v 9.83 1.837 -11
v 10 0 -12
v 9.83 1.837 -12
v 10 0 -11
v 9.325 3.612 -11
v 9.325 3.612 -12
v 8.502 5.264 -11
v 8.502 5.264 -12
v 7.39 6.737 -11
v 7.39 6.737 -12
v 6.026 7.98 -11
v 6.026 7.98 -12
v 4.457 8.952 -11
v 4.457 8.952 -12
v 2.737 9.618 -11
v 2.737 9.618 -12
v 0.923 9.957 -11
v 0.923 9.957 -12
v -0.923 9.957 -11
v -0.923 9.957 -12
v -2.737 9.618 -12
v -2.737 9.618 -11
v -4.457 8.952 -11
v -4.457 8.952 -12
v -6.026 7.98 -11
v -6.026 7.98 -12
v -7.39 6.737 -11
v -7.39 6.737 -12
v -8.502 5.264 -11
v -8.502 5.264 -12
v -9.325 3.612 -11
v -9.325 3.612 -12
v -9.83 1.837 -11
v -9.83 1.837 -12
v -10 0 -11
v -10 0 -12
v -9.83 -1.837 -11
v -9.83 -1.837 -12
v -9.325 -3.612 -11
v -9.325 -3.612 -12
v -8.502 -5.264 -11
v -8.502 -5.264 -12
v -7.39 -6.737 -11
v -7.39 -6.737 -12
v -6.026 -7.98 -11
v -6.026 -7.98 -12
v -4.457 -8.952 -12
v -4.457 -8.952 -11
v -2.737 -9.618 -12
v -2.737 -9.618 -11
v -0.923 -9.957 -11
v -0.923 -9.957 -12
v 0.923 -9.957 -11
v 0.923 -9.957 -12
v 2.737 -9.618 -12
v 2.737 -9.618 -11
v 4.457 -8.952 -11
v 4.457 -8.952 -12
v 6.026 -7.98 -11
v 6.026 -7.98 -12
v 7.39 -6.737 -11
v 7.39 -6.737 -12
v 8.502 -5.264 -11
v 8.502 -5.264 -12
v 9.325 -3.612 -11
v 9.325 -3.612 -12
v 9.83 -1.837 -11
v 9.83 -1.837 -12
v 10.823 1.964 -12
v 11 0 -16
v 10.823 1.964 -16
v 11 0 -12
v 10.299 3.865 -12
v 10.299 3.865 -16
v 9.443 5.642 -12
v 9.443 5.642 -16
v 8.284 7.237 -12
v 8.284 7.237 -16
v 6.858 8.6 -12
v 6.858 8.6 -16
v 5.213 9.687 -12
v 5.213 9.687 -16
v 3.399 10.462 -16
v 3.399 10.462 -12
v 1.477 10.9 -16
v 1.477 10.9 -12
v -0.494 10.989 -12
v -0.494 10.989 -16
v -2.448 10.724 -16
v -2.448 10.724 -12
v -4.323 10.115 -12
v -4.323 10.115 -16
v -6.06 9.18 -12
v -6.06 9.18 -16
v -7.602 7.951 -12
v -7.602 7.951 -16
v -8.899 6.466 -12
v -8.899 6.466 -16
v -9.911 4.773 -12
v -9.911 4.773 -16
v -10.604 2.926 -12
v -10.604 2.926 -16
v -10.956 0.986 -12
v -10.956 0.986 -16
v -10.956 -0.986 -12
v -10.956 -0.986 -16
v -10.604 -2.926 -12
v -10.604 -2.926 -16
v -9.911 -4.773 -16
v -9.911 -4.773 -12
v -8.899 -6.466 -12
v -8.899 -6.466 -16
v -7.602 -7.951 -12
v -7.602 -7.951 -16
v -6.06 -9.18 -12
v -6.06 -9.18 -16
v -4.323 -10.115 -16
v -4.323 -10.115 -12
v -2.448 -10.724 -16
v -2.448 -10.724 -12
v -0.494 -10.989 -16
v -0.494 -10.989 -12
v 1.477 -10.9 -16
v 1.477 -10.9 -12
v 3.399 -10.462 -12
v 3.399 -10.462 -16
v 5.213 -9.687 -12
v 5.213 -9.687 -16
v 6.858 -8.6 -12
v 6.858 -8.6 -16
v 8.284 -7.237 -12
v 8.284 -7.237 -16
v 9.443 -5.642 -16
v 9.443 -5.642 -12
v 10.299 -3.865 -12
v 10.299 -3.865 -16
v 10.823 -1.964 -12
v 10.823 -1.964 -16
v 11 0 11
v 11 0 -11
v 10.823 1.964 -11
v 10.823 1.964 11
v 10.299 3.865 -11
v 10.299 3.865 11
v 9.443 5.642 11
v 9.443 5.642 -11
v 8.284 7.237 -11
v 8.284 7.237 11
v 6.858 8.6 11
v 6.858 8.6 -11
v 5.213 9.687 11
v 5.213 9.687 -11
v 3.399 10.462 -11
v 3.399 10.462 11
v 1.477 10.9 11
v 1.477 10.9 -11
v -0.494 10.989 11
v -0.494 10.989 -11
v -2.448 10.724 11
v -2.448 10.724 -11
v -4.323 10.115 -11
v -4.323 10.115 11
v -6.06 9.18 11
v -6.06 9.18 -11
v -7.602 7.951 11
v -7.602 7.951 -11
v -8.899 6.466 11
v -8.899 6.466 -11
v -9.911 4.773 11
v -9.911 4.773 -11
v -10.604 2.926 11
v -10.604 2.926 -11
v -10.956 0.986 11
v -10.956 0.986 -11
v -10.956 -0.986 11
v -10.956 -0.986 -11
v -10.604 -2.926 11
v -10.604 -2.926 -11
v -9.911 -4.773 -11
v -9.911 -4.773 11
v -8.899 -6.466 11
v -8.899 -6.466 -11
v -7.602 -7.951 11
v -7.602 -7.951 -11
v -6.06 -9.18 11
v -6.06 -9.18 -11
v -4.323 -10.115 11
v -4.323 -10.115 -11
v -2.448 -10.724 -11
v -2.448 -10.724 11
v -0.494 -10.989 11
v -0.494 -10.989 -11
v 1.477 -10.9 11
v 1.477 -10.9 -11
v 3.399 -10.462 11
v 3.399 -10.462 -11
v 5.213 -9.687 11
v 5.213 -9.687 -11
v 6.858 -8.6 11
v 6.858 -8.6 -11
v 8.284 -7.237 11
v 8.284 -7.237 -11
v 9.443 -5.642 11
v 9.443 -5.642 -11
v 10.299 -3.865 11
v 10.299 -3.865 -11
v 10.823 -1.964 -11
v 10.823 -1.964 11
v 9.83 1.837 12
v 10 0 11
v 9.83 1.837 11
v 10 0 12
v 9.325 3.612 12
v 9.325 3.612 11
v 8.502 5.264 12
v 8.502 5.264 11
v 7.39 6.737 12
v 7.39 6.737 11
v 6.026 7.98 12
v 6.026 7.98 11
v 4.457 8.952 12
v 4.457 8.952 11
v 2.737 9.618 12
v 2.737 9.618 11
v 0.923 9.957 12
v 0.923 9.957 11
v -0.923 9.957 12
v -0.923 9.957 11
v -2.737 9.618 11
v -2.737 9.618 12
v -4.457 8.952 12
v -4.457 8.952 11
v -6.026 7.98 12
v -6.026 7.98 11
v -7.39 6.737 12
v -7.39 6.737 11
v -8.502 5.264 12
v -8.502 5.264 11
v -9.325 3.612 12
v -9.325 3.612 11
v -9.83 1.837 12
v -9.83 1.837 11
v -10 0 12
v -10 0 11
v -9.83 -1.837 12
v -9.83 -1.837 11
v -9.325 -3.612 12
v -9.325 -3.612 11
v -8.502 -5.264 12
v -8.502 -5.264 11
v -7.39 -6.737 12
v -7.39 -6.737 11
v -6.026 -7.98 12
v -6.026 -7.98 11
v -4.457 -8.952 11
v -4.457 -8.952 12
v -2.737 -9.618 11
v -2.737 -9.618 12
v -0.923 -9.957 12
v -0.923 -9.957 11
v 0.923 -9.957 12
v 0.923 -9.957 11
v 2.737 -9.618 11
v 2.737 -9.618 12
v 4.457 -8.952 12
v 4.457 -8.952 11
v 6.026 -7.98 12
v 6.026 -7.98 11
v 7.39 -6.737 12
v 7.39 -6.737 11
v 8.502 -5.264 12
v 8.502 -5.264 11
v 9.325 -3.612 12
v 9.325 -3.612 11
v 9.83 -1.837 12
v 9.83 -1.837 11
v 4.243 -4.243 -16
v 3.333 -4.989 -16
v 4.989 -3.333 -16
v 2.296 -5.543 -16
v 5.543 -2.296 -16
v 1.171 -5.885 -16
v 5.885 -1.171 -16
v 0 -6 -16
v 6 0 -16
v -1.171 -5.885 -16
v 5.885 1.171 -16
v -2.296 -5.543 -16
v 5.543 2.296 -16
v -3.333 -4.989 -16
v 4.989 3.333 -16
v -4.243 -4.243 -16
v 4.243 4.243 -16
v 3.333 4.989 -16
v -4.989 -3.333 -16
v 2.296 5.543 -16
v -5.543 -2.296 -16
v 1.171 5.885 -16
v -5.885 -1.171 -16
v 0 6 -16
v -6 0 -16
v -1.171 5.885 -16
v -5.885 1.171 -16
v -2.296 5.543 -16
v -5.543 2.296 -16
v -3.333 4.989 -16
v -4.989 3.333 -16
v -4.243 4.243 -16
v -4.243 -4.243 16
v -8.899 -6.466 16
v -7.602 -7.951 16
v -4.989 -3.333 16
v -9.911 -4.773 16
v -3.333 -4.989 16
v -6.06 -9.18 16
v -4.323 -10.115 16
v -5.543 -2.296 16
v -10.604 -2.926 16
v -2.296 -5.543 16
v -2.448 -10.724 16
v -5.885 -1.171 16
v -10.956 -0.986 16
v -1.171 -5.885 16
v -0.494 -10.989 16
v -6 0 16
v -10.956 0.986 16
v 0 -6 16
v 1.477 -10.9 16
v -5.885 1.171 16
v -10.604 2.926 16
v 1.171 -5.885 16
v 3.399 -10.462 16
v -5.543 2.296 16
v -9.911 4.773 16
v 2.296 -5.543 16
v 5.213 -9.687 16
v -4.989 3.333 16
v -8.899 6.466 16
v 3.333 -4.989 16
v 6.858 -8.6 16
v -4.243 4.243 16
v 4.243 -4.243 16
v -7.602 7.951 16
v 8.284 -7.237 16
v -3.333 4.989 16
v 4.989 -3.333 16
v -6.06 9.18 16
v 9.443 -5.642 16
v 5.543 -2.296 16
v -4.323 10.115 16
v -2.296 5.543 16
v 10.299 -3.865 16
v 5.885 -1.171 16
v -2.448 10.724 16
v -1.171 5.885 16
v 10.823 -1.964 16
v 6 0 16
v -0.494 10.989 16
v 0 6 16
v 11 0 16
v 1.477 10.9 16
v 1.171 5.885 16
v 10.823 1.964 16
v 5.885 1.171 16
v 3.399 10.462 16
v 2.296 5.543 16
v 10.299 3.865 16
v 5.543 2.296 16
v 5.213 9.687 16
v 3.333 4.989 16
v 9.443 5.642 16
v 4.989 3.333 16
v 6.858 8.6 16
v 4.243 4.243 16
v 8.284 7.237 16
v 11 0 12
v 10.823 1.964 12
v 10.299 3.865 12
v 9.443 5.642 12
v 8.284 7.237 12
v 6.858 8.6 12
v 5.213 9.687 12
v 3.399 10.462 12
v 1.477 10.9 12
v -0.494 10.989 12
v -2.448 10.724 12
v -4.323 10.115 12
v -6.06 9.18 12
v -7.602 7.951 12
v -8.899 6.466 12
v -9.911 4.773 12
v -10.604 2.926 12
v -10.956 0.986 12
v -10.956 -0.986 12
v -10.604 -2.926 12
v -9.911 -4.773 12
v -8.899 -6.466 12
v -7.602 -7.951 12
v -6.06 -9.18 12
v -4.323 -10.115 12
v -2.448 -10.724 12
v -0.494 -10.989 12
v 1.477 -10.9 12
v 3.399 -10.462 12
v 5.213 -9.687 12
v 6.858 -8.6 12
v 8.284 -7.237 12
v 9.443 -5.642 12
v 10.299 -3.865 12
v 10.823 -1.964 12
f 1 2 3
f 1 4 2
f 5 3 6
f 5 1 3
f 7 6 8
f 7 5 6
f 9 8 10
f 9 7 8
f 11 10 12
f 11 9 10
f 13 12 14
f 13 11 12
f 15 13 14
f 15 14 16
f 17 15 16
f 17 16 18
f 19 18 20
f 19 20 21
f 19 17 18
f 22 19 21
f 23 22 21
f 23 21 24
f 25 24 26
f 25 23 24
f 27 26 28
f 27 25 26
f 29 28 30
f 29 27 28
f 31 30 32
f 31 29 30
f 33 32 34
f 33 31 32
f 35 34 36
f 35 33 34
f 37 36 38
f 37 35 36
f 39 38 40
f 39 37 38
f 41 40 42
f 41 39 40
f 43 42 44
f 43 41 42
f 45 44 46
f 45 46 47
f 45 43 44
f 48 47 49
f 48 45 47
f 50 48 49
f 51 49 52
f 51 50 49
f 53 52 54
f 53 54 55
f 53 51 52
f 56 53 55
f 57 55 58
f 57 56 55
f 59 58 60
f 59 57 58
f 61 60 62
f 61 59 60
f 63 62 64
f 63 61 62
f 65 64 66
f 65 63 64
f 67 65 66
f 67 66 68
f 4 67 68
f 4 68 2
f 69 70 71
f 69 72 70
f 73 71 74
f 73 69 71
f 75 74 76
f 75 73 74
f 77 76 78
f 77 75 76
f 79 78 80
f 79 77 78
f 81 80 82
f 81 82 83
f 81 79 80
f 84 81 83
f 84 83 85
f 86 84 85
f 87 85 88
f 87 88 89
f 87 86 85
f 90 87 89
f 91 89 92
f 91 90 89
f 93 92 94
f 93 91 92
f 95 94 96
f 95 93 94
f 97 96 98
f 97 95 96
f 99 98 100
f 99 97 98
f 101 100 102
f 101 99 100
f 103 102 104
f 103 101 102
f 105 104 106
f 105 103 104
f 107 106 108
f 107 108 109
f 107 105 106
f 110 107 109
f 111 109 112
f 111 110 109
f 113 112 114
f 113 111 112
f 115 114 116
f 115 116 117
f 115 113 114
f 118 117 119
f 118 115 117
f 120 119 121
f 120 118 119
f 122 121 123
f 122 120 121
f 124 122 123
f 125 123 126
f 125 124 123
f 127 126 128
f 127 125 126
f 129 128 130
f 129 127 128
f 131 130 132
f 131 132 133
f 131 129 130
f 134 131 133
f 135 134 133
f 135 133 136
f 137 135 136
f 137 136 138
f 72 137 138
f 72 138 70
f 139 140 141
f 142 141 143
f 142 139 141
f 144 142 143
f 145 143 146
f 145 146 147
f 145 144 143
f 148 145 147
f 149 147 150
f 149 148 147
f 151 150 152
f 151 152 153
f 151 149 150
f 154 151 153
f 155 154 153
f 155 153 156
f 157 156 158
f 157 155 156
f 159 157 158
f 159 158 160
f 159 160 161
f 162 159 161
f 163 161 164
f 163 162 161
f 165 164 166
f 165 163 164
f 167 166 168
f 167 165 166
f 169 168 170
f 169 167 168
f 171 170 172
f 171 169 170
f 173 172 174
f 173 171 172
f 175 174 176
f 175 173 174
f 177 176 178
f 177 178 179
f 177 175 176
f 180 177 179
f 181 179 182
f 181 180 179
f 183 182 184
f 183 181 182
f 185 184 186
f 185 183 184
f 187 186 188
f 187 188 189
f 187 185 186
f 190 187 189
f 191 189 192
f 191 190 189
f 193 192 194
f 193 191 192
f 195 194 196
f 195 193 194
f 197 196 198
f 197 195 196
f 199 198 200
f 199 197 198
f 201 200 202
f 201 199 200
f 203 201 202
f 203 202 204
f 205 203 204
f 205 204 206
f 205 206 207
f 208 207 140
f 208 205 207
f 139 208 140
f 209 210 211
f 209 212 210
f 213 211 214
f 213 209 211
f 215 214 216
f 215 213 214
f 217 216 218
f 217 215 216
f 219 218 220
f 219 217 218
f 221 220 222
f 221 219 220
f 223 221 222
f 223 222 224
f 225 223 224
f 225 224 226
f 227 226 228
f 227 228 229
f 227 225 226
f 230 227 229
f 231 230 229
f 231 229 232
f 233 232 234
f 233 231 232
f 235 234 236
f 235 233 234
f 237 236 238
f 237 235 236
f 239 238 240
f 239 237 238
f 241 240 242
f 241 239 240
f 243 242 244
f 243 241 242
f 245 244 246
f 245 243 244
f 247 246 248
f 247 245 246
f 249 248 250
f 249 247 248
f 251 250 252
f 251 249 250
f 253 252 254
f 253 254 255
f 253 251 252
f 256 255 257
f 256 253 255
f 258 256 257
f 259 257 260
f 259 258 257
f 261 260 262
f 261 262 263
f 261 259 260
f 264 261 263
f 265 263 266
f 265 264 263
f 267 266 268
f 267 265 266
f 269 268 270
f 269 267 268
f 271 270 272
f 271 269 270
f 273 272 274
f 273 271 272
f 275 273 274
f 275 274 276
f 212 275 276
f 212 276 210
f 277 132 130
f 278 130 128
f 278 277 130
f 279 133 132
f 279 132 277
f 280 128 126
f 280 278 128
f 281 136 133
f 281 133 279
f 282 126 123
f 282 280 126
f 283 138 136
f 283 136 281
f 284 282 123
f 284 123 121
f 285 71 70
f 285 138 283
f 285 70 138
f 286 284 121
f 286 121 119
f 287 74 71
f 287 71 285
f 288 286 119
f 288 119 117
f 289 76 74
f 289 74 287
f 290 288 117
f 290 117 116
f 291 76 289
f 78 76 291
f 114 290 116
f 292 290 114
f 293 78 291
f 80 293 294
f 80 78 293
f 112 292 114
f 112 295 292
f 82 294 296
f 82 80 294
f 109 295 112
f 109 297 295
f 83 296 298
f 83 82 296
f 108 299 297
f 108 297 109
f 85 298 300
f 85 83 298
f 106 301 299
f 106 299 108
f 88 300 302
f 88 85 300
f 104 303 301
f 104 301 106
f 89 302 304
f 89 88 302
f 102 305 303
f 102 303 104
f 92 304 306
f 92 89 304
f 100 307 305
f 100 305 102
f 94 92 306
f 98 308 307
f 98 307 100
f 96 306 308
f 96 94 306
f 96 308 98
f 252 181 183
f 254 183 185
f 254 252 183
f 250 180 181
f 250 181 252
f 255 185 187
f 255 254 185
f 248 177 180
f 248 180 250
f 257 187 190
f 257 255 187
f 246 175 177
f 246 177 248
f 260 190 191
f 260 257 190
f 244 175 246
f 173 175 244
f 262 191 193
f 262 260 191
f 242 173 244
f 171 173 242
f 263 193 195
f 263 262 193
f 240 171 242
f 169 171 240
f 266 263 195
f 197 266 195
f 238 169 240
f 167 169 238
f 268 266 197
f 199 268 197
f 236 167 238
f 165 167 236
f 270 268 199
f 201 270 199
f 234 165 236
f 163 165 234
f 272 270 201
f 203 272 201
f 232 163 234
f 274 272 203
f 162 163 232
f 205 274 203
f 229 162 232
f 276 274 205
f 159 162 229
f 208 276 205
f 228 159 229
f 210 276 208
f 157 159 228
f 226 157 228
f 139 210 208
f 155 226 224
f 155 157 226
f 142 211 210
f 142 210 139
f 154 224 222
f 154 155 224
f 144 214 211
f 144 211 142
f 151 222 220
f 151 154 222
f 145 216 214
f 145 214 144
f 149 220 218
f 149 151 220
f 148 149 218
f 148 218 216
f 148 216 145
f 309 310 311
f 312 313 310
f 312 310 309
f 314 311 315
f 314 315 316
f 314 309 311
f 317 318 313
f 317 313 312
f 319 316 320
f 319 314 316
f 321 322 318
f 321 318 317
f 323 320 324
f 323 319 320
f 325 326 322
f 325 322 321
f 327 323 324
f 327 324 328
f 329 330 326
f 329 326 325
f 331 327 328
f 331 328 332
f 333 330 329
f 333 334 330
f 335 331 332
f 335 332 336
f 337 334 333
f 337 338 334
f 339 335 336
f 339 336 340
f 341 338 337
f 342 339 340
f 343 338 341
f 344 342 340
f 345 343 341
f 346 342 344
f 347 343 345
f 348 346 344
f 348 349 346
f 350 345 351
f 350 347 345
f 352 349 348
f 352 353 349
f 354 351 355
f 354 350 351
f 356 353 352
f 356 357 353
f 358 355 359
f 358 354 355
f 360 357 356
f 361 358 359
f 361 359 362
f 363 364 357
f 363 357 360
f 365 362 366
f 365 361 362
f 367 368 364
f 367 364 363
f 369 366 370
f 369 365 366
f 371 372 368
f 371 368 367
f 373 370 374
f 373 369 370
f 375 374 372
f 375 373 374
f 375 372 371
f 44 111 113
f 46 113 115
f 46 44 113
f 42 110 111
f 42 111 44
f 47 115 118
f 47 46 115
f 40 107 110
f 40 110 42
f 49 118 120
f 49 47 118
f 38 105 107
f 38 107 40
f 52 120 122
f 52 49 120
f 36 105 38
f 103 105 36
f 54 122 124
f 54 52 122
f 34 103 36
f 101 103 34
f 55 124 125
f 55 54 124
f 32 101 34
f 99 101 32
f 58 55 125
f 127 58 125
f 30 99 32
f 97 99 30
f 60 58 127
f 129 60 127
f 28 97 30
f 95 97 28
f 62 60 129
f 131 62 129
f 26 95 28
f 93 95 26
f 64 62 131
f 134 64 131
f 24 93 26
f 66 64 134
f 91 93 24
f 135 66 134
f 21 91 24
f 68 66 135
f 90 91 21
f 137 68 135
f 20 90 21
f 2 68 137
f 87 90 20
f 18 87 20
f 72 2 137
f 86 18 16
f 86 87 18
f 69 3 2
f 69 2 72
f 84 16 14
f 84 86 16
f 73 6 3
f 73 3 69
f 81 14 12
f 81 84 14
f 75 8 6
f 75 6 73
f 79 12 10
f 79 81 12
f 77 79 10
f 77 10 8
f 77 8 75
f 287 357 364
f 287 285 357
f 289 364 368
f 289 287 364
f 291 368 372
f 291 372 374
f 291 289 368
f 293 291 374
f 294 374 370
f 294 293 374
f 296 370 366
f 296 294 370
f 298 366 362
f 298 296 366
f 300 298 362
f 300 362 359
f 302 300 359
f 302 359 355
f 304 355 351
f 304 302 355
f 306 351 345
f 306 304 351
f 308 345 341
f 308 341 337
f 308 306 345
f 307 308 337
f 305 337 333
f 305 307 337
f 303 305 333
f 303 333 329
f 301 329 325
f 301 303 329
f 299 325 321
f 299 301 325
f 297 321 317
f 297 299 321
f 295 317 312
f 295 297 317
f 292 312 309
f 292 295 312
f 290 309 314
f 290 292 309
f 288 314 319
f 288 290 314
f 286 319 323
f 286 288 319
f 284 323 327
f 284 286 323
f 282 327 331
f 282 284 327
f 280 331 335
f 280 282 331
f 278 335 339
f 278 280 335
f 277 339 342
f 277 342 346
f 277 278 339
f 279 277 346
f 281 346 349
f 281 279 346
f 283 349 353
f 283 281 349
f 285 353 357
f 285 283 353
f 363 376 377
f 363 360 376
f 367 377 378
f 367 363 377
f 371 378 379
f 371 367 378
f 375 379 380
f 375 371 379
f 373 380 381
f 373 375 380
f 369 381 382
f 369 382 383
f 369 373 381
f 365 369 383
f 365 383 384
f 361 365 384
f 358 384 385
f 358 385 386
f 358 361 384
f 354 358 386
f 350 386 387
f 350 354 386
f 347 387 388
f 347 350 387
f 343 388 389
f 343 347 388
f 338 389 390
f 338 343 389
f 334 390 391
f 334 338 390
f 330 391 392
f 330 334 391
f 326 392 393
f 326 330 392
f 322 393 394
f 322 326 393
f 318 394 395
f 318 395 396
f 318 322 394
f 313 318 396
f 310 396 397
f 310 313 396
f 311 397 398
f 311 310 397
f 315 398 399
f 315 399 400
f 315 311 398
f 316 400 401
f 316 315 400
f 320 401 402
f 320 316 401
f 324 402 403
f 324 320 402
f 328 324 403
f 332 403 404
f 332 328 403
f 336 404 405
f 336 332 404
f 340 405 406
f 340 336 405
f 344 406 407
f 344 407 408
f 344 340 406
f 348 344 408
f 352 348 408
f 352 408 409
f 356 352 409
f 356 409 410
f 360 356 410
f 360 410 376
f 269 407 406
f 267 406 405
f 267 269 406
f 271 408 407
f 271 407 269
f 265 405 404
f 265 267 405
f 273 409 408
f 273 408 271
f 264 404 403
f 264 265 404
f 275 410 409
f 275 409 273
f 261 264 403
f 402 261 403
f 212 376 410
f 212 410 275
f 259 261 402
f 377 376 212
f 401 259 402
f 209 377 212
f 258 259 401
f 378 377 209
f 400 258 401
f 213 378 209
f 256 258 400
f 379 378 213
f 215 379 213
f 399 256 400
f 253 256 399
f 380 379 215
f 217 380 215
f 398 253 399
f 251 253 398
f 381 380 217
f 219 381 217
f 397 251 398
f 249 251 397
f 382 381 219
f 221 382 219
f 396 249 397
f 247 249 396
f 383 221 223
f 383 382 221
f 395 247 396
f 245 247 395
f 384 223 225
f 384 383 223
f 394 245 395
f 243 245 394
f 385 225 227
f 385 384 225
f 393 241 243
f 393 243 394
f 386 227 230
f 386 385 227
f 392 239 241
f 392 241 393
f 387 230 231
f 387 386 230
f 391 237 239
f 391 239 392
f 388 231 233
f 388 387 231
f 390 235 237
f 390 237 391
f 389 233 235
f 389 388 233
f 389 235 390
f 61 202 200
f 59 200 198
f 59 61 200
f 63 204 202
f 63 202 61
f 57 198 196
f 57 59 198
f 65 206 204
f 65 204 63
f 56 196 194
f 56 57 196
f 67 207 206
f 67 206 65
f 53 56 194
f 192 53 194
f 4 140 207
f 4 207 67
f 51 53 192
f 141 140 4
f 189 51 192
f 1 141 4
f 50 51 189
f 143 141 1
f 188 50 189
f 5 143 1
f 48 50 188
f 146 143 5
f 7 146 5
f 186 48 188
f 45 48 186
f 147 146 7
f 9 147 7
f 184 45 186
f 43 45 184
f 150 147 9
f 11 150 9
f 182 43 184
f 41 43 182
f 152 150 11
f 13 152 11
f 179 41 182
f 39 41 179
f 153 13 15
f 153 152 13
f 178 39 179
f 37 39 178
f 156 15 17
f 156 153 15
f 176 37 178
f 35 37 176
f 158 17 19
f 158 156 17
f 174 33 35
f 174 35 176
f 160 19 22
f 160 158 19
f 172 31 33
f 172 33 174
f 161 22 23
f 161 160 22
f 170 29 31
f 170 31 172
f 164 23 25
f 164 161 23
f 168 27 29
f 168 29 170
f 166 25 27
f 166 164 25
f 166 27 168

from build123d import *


with BuildPart() as part:
    # Sketch → Revolution (revolve)
    with BuildSketch(Plane.XZ):
        Polygon((6, 16), (6, -16), (11, -16), (11, -12), (10, -12), (10, -11), (11, -11), (11, 11), (10, 11), (10, 12), (11, 12), (11, 16), align=None)
    revolve(axis=Axis((0, 0, 0), (0, 0, 1)))


solid = part.part
